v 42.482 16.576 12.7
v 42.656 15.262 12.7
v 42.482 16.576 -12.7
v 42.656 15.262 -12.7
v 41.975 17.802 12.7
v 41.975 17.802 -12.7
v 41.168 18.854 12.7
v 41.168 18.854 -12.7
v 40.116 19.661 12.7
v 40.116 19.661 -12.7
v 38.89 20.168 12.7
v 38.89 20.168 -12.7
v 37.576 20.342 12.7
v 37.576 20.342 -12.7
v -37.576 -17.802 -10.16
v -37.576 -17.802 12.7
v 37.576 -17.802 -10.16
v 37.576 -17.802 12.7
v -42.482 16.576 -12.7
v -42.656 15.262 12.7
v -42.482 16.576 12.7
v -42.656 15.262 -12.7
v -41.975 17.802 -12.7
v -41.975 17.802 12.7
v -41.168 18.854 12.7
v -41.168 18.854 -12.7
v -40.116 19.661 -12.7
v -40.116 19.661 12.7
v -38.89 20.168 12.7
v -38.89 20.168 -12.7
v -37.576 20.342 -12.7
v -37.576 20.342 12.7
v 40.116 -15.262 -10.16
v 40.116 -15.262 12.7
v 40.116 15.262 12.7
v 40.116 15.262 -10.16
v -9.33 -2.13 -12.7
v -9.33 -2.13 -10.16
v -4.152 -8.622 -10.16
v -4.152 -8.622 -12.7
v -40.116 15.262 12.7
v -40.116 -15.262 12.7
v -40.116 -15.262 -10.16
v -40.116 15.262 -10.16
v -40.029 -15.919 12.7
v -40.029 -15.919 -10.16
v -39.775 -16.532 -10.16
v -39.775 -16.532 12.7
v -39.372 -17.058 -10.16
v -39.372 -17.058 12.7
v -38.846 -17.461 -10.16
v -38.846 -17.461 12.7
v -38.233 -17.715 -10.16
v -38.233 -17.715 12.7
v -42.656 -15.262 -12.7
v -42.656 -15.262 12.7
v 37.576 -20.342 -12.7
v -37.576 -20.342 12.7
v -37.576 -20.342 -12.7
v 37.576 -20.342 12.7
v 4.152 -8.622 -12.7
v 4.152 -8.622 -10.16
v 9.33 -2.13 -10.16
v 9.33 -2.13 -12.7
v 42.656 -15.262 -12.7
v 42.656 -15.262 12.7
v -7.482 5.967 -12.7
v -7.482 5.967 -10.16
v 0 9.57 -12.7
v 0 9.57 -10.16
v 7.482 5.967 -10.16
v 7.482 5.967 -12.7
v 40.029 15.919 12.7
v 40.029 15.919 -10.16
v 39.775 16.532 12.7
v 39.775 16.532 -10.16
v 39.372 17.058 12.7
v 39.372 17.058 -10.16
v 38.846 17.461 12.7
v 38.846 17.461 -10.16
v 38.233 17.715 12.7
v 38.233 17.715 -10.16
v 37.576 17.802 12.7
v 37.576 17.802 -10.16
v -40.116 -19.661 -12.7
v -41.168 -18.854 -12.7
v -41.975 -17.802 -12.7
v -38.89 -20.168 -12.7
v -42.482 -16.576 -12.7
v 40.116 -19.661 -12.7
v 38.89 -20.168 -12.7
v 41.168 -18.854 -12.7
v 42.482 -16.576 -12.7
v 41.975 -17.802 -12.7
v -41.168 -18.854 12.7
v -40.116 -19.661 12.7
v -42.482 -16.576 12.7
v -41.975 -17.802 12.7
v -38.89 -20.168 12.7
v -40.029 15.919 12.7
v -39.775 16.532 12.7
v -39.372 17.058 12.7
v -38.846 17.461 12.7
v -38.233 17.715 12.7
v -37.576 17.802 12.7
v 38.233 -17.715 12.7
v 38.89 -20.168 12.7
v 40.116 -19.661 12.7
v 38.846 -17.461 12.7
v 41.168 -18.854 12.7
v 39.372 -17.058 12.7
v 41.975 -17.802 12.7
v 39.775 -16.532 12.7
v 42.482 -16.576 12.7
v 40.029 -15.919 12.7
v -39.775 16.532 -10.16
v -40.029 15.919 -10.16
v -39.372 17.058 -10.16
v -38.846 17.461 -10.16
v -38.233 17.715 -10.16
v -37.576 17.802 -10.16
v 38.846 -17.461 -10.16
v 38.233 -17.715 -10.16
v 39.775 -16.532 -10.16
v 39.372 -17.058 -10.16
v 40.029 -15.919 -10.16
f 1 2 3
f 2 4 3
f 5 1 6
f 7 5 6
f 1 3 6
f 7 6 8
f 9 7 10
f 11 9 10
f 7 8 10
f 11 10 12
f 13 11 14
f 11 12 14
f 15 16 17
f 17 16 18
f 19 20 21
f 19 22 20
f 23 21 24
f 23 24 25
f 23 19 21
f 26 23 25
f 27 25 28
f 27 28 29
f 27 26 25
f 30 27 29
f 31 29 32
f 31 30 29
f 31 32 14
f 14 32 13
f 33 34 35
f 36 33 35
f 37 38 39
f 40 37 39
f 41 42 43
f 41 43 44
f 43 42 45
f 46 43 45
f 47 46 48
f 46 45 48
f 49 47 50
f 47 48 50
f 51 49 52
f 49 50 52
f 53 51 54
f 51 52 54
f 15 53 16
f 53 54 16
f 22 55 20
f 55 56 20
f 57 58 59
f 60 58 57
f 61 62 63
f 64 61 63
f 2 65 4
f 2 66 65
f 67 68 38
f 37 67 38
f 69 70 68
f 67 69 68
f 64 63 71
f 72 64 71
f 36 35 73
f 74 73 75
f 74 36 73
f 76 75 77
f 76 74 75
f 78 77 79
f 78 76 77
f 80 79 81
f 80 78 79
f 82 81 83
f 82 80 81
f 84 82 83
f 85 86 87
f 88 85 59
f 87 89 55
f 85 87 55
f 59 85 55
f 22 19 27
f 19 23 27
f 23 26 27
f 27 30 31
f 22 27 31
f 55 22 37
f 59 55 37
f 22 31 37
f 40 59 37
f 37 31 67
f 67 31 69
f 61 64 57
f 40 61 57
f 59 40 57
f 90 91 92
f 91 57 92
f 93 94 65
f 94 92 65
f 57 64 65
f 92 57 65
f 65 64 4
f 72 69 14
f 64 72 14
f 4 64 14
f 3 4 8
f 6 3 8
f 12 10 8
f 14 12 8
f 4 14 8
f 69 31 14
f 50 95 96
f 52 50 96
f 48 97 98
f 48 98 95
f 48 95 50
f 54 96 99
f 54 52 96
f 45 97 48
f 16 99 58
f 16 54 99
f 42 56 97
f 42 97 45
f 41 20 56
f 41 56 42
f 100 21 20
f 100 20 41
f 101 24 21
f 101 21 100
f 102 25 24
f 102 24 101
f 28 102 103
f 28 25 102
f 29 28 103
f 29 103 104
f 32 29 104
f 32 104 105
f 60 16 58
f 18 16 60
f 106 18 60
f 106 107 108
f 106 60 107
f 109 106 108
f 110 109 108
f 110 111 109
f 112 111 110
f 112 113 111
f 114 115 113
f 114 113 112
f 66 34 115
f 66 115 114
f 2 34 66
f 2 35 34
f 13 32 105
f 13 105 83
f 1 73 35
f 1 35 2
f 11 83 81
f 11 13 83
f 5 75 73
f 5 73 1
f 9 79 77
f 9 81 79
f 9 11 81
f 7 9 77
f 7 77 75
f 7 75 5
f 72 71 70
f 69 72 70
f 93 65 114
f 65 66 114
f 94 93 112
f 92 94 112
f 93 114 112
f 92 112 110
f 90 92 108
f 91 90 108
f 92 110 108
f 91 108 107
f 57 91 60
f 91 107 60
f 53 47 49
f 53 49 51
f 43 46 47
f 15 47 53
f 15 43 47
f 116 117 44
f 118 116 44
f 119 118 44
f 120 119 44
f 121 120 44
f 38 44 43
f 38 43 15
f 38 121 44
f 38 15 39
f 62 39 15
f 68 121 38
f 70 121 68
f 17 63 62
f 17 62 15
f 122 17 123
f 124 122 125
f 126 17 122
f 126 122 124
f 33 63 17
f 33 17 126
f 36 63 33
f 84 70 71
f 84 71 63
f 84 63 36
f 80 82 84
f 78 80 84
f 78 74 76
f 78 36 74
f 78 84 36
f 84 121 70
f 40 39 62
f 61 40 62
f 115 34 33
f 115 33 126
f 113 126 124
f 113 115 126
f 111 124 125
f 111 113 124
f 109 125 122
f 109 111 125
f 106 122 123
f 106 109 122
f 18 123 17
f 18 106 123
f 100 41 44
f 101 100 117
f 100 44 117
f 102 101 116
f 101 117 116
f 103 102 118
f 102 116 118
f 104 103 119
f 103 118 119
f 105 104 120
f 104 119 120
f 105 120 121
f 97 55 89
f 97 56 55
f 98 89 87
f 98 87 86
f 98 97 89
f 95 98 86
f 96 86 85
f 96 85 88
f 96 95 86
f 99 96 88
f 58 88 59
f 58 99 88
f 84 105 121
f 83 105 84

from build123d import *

# Parameters (mm, degrees)
F0_W     = 85.31113
F0_H     = 40.683054
F1_DEPTH = 12.7
F2_R     = 5.08
F3_T     = -2.54
F5_DEPTH = 2.54


with BuildPart() as f1:
    # F0 (on Top) → F1 (new body, symmetric)
    with BuildSketch(Plane.XY):
        Rectangle(F0_W, F0_H)
    extrude(amount=F1_DEPTH, both=True)

    # F2
    f2_edges = [f1.edges().sort_by_distance(p)[0] for p in [
        (42.655565, -20.341527, 0),
        (42.655565, 20.341527, 0),
        (-42.655565, -20.341527, 0),
        (-42.655565, 20.341527, 0),
    ]]
    fillet(f2_edges, radius=F2_R)

    # F3
    f3_openings = [f1.faces().sort_by_distance(p)[0] for p in [
        (0, 0, 12.7),
    ]]
    offset(amount=F3_T, openings=f3_openings)

    # F4 (on face) → F5 (cut, through all)
    with BuildSketch(Plane.XY.offset(-10.16)):
        Polygon((-7.482303, 5.966937), (-9.330279, -2.129575), (-4.152365, -8.622474), (4.152365, -8.622474), (9.330279, -2.129575), (7.482303, 5.966937), (0, 9.570225), align=None)
    extrude(amount=-F5_DEPTH, mode=Mode.SUBTRACT)


solid = f1.part
